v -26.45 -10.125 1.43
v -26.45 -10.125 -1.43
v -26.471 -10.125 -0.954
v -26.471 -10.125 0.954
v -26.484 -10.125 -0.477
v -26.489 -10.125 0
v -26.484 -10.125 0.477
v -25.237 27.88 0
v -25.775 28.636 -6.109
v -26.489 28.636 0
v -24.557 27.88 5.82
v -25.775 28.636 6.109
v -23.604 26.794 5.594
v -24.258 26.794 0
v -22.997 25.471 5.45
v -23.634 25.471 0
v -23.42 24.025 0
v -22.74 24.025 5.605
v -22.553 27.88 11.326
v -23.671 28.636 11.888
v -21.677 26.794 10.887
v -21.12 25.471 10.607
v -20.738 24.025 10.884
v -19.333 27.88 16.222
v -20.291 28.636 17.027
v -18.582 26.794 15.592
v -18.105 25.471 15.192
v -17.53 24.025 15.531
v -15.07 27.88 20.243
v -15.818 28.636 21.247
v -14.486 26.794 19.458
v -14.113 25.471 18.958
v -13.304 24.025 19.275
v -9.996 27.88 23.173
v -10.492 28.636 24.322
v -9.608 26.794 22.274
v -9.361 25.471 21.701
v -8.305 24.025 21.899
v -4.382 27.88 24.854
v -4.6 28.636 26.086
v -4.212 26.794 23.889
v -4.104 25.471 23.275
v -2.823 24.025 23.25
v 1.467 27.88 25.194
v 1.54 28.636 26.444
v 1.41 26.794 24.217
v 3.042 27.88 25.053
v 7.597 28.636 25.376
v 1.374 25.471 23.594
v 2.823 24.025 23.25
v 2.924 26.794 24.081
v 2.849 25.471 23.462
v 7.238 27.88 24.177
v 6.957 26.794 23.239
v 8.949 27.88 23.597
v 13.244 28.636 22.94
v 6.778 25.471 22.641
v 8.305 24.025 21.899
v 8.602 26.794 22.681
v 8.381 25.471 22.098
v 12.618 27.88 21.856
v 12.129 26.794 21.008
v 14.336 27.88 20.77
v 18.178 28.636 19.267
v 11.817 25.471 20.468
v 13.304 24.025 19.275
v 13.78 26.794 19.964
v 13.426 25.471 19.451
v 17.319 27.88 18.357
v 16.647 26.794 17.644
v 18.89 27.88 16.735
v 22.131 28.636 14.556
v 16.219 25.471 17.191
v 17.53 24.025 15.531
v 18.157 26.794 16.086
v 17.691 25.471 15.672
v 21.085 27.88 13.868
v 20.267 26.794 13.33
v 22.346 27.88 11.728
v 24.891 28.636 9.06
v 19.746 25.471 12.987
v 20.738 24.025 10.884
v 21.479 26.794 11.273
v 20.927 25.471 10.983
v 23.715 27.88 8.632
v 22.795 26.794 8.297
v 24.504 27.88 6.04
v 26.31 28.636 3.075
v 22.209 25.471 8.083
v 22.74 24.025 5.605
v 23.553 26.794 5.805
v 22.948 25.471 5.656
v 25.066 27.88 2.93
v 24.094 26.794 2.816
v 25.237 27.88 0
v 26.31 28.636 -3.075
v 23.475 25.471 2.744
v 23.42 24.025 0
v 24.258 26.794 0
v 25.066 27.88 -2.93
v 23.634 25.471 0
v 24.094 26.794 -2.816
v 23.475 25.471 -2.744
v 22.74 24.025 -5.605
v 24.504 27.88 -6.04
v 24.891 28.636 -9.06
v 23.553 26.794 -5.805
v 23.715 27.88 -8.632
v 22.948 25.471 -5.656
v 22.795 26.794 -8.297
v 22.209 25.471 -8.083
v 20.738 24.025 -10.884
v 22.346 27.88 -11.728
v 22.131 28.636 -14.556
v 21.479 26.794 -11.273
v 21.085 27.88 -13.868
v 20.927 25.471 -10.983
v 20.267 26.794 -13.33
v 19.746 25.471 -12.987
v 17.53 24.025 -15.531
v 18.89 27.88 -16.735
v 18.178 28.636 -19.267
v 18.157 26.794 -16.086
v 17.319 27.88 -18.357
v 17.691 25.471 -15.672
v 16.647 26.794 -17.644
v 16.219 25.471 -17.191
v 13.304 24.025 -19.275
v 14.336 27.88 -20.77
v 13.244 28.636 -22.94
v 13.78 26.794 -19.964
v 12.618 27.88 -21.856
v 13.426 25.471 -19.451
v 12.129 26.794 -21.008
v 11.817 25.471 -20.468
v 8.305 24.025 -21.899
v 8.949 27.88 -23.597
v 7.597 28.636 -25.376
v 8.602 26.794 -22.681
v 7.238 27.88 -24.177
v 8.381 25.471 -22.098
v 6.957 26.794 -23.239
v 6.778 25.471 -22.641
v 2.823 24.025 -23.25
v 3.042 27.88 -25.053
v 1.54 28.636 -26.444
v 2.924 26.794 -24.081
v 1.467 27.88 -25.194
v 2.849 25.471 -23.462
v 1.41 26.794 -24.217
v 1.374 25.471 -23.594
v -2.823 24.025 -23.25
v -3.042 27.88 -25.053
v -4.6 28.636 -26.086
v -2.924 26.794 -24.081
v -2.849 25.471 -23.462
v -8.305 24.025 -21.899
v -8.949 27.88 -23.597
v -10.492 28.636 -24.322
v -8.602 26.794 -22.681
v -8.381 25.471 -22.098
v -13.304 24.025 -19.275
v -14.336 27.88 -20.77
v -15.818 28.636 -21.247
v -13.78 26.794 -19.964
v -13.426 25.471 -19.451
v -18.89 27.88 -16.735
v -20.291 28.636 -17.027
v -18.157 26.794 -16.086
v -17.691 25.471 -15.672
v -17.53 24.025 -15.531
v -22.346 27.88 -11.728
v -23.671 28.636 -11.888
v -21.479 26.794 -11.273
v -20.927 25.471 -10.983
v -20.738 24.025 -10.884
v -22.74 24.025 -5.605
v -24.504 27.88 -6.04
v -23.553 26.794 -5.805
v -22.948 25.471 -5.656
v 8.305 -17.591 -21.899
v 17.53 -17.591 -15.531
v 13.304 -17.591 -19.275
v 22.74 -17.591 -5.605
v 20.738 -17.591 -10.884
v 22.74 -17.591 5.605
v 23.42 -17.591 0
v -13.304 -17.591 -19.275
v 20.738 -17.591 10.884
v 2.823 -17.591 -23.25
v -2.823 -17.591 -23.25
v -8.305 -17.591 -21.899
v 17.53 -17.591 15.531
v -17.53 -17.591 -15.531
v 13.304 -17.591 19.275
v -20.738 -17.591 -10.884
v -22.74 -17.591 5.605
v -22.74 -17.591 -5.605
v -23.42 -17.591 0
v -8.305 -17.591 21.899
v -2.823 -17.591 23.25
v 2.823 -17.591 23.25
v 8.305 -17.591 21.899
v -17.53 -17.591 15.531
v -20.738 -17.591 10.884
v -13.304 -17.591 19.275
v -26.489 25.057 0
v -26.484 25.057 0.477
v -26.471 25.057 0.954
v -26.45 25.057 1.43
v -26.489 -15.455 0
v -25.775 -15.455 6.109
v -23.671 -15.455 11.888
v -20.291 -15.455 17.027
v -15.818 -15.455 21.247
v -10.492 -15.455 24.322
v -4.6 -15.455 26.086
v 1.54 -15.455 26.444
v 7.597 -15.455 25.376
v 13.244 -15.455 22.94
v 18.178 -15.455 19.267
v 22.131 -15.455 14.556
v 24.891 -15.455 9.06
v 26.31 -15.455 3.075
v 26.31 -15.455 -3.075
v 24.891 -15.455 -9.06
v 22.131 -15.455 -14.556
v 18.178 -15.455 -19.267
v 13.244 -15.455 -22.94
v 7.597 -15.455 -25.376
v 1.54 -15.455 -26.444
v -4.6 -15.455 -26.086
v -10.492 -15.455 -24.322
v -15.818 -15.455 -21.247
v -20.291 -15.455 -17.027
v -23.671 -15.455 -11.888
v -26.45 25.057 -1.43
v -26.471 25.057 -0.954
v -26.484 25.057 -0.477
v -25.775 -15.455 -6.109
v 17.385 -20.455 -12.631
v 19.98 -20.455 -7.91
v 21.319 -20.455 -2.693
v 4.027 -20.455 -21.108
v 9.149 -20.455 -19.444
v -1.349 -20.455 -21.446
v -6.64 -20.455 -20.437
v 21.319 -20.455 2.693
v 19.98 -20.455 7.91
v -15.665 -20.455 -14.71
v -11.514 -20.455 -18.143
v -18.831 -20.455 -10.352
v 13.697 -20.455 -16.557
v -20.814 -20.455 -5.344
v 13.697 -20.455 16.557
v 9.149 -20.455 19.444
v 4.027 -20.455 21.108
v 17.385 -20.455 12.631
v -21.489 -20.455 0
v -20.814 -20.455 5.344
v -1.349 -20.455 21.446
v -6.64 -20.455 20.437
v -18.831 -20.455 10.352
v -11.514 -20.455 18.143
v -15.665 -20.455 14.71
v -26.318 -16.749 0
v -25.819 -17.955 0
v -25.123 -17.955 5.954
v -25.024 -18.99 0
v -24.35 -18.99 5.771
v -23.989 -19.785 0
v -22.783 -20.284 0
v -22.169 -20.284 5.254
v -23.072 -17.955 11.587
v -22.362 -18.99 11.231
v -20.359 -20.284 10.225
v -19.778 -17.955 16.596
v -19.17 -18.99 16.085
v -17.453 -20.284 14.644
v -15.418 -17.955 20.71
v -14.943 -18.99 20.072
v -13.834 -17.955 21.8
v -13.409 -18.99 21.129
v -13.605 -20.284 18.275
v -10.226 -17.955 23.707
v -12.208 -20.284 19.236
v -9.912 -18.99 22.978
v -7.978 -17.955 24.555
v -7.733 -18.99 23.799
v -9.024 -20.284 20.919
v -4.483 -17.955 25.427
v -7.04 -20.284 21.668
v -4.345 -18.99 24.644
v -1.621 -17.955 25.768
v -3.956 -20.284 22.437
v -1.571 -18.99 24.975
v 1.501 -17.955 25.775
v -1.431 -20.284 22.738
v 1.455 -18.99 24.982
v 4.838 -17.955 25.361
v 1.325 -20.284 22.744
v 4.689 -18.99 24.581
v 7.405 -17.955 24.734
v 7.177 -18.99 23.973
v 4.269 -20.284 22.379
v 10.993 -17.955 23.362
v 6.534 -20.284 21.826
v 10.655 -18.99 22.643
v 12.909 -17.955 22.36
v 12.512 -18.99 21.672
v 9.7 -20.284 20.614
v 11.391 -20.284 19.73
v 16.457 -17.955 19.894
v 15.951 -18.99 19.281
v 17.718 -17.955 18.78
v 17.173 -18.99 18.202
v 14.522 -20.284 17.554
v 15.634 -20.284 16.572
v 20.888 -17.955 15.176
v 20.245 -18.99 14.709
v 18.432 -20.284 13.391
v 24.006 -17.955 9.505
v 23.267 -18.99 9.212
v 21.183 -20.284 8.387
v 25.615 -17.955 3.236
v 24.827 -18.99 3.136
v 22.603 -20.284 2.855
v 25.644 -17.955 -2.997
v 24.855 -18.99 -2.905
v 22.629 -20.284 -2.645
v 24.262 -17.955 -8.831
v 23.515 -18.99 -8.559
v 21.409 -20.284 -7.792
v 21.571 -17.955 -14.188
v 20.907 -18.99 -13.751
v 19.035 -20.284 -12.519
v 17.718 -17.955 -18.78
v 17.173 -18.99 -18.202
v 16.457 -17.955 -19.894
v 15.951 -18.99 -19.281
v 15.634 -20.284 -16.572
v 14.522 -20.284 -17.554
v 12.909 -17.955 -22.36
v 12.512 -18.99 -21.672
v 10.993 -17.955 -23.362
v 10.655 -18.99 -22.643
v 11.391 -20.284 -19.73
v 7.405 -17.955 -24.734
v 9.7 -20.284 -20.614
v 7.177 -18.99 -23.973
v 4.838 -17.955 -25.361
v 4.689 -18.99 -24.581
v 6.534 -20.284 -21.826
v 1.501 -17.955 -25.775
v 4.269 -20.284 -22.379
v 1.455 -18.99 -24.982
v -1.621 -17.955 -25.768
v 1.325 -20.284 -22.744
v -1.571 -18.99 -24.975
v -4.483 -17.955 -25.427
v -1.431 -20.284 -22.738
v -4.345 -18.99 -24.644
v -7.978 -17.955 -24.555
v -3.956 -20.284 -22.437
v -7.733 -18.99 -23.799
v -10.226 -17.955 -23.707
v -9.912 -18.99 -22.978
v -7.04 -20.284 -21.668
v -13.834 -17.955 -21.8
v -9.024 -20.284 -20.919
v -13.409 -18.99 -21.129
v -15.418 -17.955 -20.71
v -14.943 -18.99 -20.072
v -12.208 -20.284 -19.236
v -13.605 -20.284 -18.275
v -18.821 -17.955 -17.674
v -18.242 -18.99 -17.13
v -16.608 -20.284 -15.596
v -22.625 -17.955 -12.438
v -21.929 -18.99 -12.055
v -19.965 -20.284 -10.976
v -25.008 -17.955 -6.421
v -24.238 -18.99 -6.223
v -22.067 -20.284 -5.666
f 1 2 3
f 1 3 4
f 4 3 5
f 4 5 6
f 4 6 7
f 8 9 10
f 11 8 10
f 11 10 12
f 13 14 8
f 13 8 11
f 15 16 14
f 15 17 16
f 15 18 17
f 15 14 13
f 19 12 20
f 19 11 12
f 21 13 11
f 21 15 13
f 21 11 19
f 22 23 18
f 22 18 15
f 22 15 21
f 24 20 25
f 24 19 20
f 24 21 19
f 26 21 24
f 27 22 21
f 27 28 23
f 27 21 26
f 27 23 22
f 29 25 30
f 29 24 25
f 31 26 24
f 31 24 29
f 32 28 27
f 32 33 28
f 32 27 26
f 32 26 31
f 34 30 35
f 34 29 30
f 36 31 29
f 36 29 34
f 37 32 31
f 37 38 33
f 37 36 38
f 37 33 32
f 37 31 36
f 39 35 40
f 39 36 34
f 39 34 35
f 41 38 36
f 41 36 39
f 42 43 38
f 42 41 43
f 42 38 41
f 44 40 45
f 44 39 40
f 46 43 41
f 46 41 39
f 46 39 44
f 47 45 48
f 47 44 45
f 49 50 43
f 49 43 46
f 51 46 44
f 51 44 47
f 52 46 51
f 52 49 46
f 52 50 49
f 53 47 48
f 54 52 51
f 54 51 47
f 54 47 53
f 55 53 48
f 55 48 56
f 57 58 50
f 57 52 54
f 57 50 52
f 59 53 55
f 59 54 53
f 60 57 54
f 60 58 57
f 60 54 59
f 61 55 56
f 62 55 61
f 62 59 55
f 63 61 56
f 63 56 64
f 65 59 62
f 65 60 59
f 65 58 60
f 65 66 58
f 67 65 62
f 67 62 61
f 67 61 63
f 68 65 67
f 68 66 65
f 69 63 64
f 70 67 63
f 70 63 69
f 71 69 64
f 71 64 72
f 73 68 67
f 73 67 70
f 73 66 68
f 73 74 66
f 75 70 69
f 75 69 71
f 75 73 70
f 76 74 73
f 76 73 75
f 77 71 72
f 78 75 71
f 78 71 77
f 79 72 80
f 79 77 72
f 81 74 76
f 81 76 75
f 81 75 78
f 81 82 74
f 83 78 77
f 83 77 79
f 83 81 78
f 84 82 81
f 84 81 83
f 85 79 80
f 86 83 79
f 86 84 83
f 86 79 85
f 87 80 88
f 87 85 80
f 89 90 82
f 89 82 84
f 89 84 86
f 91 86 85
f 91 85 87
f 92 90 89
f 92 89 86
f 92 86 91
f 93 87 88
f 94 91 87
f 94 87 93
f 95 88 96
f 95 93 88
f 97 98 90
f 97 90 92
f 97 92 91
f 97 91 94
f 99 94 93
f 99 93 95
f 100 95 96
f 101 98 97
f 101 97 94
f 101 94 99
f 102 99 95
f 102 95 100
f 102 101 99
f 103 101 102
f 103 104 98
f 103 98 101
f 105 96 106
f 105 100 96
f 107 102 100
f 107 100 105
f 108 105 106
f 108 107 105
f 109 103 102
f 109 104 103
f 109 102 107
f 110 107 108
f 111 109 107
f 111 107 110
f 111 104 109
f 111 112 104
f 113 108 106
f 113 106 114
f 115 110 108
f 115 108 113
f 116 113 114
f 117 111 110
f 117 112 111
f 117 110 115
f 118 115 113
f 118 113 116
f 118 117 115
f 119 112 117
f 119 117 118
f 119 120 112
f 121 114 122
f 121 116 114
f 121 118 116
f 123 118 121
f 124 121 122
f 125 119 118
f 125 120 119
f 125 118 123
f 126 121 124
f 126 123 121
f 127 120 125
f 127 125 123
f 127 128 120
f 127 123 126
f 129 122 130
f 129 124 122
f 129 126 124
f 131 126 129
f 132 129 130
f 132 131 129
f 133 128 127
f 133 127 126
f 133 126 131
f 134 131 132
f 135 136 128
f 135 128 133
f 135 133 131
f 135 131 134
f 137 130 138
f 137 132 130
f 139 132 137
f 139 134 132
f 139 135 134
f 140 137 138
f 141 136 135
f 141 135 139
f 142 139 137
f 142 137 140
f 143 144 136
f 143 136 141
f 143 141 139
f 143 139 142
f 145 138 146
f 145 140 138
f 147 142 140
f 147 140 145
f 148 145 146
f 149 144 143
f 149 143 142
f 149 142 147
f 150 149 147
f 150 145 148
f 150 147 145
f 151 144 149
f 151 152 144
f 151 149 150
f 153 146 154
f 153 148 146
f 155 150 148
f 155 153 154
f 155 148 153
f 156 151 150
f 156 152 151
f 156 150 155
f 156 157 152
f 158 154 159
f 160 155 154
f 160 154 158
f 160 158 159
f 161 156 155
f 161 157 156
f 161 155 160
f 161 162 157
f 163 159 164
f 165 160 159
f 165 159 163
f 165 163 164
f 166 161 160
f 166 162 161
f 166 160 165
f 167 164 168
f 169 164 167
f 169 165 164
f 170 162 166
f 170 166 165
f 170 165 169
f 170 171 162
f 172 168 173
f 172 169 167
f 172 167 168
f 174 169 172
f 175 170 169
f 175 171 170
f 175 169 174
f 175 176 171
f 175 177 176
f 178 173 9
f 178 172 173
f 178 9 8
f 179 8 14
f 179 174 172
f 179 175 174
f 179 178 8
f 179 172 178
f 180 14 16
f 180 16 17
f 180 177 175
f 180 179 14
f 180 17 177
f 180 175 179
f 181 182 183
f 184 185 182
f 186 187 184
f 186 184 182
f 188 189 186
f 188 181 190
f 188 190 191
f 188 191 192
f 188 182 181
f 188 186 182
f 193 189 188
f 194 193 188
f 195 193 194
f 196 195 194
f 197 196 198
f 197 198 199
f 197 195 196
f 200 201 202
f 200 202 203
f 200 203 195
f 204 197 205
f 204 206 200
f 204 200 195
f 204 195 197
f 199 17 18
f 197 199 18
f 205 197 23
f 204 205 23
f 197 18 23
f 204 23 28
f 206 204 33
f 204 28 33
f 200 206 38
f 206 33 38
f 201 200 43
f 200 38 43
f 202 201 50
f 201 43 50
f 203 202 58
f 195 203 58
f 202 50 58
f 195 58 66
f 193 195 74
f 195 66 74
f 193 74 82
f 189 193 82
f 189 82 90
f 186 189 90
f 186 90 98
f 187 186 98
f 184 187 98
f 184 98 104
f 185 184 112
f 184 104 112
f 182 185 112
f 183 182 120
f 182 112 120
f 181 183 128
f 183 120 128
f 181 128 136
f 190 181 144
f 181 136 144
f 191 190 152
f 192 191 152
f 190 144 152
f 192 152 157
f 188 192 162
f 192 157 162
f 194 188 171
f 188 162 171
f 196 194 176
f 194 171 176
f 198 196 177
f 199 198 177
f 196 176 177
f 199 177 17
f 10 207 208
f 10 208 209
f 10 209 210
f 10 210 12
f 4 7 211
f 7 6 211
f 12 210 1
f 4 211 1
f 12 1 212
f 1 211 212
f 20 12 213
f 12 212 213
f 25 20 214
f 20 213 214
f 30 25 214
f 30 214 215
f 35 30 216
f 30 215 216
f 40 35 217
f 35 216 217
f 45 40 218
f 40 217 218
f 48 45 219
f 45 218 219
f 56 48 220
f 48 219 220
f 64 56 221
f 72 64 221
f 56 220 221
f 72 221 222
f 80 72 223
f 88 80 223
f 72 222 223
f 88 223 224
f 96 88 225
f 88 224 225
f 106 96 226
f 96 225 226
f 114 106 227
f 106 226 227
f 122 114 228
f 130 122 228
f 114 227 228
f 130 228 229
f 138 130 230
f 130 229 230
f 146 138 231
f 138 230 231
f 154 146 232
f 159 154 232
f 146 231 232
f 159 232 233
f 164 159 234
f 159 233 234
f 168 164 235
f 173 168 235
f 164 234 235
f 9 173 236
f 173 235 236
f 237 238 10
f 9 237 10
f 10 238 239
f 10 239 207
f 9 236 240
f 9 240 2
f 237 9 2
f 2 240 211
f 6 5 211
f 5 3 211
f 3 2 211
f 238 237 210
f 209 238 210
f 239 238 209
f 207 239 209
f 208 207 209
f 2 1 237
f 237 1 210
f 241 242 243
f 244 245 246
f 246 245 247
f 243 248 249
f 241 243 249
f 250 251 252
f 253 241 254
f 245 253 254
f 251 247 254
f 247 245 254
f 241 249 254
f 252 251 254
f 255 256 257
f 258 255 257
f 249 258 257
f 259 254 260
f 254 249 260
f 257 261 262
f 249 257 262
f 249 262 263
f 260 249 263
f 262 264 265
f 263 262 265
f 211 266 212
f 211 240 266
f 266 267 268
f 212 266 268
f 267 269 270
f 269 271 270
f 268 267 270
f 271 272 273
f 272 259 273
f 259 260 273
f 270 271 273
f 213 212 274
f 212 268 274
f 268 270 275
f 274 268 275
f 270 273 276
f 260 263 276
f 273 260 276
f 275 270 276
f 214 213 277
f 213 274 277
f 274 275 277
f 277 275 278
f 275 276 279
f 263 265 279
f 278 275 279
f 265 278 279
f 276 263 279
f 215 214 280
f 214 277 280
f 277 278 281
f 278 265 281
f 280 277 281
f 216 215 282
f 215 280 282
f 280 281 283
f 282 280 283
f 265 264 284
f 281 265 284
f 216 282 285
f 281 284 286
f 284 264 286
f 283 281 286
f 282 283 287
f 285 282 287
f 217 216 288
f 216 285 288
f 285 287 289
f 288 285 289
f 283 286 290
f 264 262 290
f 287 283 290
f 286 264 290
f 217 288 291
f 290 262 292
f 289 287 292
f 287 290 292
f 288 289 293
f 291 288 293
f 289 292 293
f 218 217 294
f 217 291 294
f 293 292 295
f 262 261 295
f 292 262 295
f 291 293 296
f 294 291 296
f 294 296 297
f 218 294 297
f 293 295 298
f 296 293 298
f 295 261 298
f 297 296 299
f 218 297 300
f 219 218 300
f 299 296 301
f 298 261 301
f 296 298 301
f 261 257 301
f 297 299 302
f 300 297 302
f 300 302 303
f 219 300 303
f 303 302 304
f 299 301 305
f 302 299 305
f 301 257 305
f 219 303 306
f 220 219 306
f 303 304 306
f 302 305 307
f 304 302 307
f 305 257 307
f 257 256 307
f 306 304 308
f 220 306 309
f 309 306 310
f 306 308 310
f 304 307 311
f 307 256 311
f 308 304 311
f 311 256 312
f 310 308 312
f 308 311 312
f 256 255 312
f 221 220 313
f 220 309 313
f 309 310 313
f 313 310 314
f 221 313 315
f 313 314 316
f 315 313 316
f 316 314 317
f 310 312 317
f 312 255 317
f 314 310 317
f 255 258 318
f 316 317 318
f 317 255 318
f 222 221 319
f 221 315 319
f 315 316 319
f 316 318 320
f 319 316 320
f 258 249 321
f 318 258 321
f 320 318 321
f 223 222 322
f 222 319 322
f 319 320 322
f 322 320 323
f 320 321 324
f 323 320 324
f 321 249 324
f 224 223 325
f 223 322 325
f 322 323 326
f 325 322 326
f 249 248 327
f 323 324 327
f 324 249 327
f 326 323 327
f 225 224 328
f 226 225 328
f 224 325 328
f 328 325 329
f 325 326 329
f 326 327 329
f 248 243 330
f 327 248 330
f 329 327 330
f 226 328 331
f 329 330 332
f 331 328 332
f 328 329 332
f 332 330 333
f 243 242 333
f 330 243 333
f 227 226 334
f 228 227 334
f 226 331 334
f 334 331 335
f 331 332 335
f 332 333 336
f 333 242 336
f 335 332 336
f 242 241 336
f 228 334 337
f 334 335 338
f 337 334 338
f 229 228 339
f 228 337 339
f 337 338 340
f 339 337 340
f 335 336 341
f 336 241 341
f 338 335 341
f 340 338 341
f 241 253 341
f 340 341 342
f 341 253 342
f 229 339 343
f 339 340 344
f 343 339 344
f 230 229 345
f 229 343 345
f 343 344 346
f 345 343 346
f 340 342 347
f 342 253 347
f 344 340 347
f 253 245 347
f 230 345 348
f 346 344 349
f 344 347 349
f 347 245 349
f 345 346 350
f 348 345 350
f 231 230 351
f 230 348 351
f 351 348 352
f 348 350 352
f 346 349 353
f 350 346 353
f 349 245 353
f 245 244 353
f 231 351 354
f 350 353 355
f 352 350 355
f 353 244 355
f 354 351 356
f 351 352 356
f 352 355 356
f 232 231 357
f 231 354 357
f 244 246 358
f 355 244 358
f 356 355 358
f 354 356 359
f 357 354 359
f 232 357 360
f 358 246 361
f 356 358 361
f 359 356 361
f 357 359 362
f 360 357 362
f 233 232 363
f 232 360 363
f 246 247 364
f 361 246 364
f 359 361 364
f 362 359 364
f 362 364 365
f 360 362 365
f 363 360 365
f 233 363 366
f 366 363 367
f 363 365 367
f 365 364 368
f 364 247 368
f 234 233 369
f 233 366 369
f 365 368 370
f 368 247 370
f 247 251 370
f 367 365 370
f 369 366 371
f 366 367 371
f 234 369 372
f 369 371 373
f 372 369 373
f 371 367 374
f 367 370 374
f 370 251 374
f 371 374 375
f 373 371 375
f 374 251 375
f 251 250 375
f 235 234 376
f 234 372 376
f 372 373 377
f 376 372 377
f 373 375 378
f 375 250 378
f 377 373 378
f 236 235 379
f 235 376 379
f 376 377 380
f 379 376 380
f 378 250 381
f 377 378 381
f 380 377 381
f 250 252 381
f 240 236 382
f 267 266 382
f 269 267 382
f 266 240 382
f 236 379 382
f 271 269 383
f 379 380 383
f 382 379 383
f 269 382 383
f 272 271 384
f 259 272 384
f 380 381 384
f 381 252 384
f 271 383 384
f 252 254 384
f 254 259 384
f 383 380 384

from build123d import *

# Parameters (mm, degrees)
F0_W     = 23.4204549342
F0_H     = 2.8636362404
F3_R     = 5
F5_W     = 35.1818175986
F5_H     = 36.409093067
F6_DEPTH = 64


# Not quite as in the source:
# - a fillet or chamfer that OpenCascade refuses, or shapes differently, is made with other operations: its cross-section is extruded or revolved along the edge and cut away or added


with BuildPart() as f1:
    # F0 (on Top) → F1 (revolve)
    with BuildSketch(Plane.XY):
        Polygon((-23.4204549342, 28.6363661289), (-26.4886375517, 28.6363661289), (-26.4886375517, -20.4545464367), (-23.4204549342, -20.4545464367), (-23.4204549342, -17.5909101963), align=None)
        with Locations((-11.7102274671, -19.0227283165)):
            Rectangle(F0_W, F0_H)
    revolve(axis=Axis((0, -19.0227283165, 0), (0, 1, 0)))

    # F3
    f3_edges = [f1.edges().sort_by_distance(p)[0] for p in [
        (26.488638, -20.454546, 0),
    ]]
    fillet(f3_edges, radius=F3_R)

    # F4: fillet of radius 5 on 1 edges, made by hand

    # F4_s1 → F4_t2 (revolve, cut)
    with BuildSketch(Plane.XY):
        with BuildLine():
            ThreePointArc((-26.4886375517, 28.6363661289), (-24.2575781097, 26.7941920001), (-23.4204549342, 24.0246330924))
            Line((-23.4204549342, 24.0246330924), (-23.4204549342, 28.6363661289))
            Line((-23.4204549342, 28.6363661289), (-26.4886375517, 28.6363661289))
        make_face()
    revolve(axis=Axis((0, 28.6363661289, 0), (0, 1, 0)), mode=Mode.SUBTRACT)

    # F5 (on offset) → F6 (cut)
    with BuildSketch(Plane.YZ.offset(-26.45)):
        with Locations((7.4659097008, -1.0227272287)):
            Rectangle(F5_W, F5_H)
    extrude(amount=-F6_DEPTH, mode=Mode.SUBTRACT)


solid = f1.part
